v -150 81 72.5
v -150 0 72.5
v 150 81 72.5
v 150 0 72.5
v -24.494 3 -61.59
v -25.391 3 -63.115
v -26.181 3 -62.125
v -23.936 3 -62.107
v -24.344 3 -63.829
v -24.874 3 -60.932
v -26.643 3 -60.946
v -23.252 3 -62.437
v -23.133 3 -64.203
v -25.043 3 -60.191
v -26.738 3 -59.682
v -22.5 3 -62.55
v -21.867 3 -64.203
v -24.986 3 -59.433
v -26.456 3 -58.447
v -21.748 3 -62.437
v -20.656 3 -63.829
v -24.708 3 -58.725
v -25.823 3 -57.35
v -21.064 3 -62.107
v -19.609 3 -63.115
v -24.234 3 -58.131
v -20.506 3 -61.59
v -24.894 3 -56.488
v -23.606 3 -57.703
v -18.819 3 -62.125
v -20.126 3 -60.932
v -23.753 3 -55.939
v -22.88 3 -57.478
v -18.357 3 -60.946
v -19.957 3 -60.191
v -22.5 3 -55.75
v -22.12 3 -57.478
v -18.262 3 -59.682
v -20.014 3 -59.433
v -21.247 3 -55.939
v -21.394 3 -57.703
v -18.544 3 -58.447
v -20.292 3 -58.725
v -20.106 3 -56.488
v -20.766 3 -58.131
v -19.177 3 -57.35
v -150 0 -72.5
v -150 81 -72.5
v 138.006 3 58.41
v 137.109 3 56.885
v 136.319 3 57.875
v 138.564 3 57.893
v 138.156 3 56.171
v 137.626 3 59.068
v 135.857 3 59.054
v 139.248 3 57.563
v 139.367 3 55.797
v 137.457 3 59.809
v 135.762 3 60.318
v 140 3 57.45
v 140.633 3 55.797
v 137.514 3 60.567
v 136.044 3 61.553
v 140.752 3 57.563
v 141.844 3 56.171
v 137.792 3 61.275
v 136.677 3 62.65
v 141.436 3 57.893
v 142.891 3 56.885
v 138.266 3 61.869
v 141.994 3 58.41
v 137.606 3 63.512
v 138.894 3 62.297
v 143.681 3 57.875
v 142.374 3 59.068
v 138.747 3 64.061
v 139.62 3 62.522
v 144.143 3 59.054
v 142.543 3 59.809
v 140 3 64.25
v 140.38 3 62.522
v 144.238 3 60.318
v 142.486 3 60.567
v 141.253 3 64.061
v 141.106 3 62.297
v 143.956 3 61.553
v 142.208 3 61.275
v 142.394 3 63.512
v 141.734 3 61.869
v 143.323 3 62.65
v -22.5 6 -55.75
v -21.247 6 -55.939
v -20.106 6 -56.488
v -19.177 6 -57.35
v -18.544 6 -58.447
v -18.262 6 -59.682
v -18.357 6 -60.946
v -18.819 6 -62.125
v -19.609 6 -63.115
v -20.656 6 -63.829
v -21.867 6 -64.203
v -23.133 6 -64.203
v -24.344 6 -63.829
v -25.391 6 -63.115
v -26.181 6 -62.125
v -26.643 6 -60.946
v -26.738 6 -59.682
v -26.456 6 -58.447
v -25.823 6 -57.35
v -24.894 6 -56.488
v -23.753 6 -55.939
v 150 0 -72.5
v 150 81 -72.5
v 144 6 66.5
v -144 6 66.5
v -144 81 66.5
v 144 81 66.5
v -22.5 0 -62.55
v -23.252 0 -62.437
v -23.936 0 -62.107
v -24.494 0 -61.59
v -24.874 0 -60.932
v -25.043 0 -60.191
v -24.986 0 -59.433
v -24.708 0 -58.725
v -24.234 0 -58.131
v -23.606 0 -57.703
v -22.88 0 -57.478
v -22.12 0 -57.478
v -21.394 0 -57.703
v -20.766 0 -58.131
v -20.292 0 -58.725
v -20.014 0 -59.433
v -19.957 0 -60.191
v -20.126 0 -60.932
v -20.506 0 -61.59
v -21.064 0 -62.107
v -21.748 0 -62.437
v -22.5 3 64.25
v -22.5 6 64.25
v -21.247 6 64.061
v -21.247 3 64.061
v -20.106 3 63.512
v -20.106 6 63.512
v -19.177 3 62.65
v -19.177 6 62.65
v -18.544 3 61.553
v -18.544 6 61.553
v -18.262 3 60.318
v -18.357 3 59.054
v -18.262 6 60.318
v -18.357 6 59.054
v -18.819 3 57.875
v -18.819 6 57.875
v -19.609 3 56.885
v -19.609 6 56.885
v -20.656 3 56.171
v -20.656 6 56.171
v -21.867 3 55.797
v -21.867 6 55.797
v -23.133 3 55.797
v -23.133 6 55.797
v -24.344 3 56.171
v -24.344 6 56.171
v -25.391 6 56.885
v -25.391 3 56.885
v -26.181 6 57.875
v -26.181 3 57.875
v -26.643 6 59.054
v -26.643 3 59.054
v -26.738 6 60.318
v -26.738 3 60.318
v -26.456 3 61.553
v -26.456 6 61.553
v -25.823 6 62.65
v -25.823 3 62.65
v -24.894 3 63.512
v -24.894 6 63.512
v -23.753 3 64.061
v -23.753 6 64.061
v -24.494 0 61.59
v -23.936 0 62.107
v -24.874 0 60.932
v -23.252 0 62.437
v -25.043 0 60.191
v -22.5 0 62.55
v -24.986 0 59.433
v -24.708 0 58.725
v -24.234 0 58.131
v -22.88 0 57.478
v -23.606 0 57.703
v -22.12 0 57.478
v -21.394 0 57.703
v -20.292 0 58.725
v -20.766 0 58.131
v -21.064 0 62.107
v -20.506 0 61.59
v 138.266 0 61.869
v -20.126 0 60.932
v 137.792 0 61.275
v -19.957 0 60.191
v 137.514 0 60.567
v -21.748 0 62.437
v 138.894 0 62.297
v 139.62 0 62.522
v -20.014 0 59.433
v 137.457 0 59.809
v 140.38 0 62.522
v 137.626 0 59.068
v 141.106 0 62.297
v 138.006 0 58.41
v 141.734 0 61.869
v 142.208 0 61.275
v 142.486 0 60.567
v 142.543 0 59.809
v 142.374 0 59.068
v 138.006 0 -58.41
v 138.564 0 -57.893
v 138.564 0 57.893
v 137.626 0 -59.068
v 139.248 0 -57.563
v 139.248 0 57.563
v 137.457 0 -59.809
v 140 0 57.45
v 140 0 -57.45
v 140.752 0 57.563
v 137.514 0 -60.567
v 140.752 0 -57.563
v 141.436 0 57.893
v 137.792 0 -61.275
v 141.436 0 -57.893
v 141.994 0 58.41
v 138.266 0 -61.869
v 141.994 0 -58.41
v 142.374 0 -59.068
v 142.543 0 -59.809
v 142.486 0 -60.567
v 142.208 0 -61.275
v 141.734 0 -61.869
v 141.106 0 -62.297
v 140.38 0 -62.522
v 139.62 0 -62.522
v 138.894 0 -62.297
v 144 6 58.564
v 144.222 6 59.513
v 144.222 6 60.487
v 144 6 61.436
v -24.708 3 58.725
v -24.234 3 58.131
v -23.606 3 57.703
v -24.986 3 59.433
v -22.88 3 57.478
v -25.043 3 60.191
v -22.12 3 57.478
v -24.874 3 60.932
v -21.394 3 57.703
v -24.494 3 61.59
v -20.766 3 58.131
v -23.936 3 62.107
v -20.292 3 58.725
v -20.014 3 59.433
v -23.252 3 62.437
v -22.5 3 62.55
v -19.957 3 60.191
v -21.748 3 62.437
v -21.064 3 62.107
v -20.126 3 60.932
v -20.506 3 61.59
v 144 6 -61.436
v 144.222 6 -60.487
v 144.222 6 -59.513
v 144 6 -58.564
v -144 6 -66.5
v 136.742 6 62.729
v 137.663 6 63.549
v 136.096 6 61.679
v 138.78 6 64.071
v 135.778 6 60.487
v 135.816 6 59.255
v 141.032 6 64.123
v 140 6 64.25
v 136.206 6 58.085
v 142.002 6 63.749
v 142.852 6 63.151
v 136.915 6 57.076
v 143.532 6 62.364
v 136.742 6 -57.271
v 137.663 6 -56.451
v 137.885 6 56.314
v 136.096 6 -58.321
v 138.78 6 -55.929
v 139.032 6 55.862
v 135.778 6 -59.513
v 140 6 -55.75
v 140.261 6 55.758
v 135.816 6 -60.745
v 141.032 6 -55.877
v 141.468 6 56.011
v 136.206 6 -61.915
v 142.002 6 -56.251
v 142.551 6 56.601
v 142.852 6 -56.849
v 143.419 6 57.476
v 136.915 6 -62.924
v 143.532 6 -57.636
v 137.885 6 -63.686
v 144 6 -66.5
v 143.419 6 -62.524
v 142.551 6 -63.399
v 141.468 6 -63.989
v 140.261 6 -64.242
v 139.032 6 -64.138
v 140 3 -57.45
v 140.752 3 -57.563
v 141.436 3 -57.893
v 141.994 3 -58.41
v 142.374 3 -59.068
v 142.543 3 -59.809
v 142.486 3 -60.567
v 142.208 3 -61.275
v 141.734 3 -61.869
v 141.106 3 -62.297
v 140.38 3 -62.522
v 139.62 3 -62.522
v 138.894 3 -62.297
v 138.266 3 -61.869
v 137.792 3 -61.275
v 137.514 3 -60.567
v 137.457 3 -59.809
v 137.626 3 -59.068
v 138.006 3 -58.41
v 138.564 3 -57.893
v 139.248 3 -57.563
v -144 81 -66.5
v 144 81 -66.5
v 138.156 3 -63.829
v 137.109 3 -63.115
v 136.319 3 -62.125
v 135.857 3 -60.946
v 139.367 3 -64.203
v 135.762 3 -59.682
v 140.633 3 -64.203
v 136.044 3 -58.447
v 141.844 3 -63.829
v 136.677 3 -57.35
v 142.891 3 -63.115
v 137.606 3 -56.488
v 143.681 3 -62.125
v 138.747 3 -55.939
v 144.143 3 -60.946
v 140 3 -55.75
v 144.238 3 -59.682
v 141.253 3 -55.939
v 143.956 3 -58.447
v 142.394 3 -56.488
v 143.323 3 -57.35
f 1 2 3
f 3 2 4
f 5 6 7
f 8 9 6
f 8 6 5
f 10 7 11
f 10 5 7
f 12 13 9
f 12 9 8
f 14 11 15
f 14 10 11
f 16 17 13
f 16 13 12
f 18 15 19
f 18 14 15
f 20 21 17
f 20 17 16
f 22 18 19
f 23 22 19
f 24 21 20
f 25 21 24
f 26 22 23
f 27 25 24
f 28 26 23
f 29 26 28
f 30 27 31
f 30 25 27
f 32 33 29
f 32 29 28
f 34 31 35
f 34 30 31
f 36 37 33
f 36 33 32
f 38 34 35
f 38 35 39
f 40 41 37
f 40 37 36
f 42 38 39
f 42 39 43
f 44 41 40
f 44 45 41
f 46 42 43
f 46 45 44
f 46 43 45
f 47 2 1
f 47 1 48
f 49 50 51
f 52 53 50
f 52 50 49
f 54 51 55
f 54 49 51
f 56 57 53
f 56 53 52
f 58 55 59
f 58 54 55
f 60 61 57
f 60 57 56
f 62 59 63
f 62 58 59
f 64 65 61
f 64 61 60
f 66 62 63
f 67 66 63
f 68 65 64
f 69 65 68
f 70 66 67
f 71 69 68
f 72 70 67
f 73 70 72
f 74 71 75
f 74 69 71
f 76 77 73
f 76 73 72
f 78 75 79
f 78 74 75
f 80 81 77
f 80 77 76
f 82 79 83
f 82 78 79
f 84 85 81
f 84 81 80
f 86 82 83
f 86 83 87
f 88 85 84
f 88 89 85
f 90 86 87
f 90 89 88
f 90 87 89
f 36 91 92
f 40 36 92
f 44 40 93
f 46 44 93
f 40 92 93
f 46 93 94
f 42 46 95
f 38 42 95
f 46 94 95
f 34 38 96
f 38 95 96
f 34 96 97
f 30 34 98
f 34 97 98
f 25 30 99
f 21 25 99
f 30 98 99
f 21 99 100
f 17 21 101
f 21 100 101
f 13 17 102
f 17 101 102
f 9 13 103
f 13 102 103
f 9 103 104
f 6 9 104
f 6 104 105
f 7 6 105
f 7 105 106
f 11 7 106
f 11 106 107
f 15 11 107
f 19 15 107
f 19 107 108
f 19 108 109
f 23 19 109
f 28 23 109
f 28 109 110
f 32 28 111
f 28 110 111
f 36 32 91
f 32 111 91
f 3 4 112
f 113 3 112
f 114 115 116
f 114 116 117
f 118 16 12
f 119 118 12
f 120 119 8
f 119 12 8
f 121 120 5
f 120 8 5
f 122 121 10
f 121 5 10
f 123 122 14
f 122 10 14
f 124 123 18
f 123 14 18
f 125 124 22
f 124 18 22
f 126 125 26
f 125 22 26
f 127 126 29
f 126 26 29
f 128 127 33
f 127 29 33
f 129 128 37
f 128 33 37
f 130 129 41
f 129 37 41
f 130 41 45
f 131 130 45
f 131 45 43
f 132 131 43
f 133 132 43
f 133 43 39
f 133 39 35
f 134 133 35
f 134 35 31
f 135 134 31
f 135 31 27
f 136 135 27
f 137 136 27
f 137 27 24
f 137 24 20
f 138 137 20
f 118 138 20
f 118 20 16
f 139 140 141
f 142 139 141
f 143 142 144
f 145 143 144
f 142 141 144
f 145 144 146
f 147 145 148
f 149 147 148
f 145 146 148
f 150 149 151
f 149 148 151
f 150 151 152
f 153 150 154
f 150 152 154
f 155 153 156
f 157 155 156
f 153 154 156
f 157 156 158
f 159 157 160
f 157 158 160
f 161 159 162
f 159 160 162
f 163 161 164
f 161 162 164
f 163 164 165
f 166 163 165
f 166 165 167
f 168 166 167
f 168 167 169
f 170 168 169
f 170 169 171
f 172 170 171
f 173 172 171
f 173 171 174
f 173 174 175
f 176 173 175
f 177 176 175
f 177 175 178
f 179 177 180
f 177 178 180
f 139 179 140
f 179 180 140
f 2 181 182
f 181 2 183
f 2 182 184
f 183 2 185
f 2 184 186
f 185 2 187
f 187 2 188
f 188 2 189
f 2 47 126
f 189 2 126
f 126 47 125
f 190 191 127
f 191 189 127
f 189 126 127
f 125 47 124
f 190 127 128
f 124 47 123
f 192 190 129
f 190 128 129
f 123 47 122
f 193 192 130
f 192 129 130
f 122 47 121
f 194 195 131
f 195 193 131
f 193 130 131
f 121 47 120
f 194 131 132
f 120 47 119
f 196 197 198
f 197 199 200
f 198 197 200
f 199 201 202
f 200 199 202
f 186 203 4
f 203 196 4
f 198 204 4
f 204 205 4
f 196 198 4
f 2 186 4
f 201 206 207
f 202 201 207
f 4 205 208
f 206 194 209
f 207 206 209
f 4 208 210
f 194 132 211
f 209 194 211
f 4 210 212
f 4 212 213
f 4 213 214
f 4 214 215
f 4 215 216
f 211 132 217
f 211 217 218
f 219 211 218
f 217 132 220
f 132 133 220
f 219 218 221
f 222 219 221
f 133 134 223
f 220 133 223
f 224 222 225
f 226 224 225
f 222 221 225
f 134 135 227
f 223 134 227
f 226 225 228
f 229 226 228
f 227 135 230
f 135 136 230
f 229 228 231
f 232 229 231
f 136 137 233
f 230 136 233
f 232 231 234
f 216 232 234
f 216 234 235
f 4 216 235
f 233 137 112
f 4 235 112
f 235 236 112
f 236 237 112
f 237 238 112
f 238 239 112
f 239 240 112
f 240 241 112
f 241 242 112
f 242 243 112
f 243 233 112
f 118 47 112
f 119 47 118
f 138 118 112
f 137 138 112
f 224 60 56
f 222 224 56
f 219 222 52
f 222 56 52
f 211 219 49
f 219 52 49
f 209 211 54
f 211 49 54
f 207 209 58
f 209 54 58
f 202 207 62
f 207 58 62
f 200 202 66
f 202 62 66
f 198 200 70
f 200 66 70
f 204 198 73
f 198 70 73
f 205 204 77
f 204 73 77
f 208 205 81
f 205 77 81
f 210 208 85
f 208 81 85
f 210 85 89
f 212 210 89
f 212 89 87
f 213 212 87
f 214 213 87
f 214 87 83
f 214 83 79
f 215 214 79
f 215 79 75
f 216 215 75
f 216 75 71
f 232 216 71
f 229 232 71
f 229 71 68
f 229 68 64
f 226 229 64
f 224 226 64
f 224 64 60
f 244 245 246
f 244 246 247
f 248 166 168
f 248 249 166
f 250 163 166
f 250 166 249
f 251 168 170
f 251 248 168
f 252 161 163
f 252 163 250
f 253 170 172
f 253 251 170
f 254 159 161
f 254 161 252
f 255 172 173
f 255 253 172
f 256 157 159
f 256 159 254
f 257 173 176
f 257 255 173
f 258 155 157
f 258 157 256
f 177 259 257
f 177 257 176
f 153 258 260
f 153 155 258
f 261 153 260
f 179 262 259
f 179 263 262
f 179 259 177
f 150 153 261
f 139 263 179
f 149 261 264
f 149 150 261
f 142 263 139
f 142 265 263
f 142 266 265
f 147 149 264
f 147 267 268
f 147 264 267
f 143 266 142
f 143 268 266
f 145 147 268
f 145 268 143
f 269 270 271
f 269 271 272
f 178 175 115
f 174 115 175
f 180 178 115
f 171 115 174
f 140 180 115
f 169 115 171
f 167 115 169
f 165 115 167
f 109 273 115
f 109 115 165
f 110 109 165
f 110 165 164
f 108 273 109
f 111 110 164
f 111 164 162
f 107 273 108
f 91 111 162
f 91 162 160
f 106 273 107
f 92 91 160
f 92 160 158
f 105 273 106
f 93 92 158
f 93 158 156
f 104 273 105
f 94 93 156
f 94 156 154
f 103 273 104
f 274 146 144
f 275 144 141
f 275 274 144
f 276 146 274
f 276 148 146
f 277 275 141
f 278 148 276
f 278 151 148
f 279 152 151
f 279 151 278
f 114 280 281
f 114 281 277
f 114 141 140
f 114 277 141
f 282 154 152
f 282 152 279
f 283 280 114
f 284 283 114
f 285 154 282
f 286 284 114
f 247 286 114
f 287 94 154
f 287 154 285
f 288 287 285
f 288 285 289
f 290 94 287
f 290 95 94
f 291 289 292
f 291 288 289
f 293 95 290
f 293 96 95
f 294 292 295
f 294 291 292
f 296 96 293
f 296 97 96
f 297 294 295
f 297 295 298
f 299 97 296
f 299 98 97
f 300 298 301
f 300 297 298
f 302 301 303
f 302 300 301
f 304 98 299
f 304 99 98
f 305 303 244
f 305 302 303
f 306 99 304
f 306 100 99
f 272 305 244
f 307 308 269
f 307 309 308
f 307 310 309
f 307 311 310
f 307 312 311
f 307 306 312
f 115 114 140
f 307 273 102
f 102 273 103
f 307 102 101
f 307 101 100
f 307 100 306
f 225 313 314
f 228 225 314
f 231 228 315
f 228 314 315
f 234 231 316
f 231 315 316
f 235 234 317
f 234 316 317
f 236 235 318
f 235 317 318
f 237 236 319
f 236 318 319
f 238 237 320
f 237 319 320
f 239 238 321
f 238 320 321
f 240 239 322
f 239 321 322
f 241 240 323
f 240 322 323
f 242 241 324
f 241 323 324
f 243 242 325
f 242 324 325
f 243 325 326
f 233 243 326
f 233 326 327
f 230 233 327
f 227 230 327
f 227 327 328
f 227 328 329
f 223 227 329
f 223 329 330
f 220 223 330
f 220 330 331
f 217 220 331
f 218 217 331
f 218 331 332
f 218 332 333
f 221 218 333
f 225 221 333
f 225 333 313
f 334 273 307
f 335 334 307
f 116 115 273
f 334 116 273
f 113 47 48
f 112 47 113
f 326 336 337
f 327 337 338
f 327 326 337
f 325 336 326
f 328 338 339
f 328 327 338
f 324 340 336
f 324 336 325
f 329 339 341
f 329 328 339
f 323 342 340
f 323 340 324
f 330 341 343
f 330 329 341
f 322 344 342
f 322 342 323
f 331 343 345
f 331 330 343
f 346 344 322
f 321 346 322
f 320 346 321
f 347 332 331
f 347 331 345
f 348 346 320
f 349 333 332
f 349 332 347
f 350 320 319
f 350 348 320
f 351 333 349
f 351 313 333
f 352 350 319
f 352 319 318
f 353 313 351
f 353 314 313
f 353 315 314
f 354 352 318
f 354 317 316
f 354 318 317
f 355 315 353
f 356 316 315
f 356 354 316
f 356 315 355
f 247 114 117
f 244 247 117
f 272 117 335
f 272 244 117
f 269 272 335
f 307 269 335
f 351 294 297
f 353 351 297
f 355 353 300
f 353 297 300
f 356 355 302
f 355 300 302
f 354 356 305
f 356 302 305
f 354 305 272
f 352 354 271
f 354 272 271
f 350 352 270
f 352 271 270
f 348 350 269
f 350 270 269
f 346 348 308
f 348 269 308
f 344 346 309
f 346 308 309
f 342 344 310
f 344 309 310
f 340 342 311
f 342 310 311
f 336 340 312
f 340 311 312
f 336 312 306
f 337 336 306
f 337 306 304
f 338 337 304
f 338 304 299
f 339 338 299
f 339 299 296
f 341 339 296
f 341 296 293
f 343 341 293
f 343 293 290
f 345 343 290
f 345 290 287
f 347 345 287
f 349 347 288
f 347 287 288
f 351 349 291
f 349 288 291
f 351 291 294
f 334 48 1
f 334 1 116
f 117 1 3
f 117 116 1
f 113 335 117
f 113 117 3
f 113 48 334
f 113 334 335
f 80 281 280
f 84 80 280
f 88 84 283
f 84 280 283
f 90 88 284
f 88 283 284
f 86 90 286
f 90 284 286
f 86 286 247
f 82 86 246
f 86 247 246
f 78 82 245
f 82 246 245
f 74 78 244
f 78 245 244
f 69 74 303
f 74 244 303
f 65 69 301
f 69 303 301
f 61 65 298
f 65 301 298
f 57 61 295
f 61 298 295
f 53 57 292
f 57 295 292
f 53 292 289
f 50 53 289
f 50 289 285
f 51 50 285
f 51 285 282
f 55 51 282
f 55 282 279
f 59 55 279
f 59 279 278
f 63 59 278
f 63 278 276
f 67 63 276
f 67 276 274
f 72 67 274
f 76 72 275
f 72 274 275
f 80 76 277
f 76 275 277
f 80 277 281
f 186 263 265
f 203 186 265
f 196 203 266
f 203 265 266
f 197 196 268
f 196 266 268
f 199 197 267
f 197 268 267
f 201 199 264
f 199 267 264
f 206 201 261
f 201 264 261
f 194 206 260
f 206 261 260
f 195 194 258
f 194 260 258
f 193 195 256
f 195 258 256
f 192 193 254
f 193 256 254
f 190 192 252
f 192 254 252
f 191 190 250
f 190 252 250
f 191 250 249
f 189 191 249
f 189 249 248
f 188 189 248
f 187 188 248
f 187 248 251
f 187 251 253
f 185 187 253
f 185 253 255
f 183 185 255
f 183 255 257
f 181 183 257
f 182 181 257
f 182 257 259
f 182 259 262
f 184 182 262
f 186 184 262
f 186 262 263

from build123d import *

# Parameters (mm, degrees)
SKETCH_1_W          = 300
SKETCH_1_H          = 145
EXTRUDE_1_DEPTH     = 81
SHELL_1_T           = -6
SKETCH_2_R          = 2.55
CUT_EXTRUDE_1_DEPTH = 183.705363906
SKETCH_3_R          = 4.25
CUT_EXTRUDE_2_DEPTH = 3


with BuildPart() as part:
    # ｽｹｯﾁ1 → ﾎﾞｽ - 押し出し1 (new body)
    with BuildSketch(Plane(origin=(0, 0, 0), x_dir=(1, 0, 0), z_dir=(0, 1, 0))):
        Rectangle(SKETCH_1_W, SKETCH_1_H)
    extrude(amount=EXTRUDE_1_DEPTH)

    # ｼｪﾙ1
    shell_1_openings = [part.faces().sort_by_distance(p)[0] for p in [
        (0, 81, 0),
    ]]
    offset(amount=SHELL_1_T, openings=shell_1_openings, kind=Kind.INTERSECTION)

    # ｽｹｯﾁ2 → ｶｯﾄ - 押し出し1 (cut, through all)
    with BuildSketch(Plane(origin=(0, 6, 0), x_dir=(1, 0, 0), z_dir=(0, 1, 0))):
        with Locations(Location((140, 60, 0), (0, 0, 270))):
            Circle(SKETCH_2_R)
        with Locations(Location((140, -60, 0), (0, 0, 90))):
            Circle(SKETCH_2_R)
        with Locations(Location((-22.5, -60, 0), (0, 0, 270))):
            Circle(SKETCH_2_R)
        with Locations(Location((-22.5, 60, 0), (0, 0, 90))):
            Circle(SKETCH_2_R)
    extrude(amount=-CUT_EXTRUDE_1_DEPTH, mode=Mode.SUBTRACT)

    # ｽｹｯﾁ3 → ｶｯﾄ - 押し出し2 (cut)
    with BuildSketch(Plane(origin=(0, 6, 0), x_dir=(1, 0, 0), z_dir=(0, 1, 0))):
        with Locations(Location((140, 60, 0), (0, 0, 270))):
            Circle(SKETCH_3_R)
        with Locations(Location((-22.5, 60, 0), (0, 0, 270))):
            Circle(SKETCH_3_R)
        with Locations(Location((-22.5, -60, 0), (0, 0, 270))):
            Circle(SKETCH_3_R)
        with Locations(Location((140, -60, 0), (0, 0, 270))):
            Circle(SKETCH_3_R)
    extrude(amount=-CUT_EXTRUDE_2_DEPTH, mode=Mode.SUBTRACT)


solid = part.part
